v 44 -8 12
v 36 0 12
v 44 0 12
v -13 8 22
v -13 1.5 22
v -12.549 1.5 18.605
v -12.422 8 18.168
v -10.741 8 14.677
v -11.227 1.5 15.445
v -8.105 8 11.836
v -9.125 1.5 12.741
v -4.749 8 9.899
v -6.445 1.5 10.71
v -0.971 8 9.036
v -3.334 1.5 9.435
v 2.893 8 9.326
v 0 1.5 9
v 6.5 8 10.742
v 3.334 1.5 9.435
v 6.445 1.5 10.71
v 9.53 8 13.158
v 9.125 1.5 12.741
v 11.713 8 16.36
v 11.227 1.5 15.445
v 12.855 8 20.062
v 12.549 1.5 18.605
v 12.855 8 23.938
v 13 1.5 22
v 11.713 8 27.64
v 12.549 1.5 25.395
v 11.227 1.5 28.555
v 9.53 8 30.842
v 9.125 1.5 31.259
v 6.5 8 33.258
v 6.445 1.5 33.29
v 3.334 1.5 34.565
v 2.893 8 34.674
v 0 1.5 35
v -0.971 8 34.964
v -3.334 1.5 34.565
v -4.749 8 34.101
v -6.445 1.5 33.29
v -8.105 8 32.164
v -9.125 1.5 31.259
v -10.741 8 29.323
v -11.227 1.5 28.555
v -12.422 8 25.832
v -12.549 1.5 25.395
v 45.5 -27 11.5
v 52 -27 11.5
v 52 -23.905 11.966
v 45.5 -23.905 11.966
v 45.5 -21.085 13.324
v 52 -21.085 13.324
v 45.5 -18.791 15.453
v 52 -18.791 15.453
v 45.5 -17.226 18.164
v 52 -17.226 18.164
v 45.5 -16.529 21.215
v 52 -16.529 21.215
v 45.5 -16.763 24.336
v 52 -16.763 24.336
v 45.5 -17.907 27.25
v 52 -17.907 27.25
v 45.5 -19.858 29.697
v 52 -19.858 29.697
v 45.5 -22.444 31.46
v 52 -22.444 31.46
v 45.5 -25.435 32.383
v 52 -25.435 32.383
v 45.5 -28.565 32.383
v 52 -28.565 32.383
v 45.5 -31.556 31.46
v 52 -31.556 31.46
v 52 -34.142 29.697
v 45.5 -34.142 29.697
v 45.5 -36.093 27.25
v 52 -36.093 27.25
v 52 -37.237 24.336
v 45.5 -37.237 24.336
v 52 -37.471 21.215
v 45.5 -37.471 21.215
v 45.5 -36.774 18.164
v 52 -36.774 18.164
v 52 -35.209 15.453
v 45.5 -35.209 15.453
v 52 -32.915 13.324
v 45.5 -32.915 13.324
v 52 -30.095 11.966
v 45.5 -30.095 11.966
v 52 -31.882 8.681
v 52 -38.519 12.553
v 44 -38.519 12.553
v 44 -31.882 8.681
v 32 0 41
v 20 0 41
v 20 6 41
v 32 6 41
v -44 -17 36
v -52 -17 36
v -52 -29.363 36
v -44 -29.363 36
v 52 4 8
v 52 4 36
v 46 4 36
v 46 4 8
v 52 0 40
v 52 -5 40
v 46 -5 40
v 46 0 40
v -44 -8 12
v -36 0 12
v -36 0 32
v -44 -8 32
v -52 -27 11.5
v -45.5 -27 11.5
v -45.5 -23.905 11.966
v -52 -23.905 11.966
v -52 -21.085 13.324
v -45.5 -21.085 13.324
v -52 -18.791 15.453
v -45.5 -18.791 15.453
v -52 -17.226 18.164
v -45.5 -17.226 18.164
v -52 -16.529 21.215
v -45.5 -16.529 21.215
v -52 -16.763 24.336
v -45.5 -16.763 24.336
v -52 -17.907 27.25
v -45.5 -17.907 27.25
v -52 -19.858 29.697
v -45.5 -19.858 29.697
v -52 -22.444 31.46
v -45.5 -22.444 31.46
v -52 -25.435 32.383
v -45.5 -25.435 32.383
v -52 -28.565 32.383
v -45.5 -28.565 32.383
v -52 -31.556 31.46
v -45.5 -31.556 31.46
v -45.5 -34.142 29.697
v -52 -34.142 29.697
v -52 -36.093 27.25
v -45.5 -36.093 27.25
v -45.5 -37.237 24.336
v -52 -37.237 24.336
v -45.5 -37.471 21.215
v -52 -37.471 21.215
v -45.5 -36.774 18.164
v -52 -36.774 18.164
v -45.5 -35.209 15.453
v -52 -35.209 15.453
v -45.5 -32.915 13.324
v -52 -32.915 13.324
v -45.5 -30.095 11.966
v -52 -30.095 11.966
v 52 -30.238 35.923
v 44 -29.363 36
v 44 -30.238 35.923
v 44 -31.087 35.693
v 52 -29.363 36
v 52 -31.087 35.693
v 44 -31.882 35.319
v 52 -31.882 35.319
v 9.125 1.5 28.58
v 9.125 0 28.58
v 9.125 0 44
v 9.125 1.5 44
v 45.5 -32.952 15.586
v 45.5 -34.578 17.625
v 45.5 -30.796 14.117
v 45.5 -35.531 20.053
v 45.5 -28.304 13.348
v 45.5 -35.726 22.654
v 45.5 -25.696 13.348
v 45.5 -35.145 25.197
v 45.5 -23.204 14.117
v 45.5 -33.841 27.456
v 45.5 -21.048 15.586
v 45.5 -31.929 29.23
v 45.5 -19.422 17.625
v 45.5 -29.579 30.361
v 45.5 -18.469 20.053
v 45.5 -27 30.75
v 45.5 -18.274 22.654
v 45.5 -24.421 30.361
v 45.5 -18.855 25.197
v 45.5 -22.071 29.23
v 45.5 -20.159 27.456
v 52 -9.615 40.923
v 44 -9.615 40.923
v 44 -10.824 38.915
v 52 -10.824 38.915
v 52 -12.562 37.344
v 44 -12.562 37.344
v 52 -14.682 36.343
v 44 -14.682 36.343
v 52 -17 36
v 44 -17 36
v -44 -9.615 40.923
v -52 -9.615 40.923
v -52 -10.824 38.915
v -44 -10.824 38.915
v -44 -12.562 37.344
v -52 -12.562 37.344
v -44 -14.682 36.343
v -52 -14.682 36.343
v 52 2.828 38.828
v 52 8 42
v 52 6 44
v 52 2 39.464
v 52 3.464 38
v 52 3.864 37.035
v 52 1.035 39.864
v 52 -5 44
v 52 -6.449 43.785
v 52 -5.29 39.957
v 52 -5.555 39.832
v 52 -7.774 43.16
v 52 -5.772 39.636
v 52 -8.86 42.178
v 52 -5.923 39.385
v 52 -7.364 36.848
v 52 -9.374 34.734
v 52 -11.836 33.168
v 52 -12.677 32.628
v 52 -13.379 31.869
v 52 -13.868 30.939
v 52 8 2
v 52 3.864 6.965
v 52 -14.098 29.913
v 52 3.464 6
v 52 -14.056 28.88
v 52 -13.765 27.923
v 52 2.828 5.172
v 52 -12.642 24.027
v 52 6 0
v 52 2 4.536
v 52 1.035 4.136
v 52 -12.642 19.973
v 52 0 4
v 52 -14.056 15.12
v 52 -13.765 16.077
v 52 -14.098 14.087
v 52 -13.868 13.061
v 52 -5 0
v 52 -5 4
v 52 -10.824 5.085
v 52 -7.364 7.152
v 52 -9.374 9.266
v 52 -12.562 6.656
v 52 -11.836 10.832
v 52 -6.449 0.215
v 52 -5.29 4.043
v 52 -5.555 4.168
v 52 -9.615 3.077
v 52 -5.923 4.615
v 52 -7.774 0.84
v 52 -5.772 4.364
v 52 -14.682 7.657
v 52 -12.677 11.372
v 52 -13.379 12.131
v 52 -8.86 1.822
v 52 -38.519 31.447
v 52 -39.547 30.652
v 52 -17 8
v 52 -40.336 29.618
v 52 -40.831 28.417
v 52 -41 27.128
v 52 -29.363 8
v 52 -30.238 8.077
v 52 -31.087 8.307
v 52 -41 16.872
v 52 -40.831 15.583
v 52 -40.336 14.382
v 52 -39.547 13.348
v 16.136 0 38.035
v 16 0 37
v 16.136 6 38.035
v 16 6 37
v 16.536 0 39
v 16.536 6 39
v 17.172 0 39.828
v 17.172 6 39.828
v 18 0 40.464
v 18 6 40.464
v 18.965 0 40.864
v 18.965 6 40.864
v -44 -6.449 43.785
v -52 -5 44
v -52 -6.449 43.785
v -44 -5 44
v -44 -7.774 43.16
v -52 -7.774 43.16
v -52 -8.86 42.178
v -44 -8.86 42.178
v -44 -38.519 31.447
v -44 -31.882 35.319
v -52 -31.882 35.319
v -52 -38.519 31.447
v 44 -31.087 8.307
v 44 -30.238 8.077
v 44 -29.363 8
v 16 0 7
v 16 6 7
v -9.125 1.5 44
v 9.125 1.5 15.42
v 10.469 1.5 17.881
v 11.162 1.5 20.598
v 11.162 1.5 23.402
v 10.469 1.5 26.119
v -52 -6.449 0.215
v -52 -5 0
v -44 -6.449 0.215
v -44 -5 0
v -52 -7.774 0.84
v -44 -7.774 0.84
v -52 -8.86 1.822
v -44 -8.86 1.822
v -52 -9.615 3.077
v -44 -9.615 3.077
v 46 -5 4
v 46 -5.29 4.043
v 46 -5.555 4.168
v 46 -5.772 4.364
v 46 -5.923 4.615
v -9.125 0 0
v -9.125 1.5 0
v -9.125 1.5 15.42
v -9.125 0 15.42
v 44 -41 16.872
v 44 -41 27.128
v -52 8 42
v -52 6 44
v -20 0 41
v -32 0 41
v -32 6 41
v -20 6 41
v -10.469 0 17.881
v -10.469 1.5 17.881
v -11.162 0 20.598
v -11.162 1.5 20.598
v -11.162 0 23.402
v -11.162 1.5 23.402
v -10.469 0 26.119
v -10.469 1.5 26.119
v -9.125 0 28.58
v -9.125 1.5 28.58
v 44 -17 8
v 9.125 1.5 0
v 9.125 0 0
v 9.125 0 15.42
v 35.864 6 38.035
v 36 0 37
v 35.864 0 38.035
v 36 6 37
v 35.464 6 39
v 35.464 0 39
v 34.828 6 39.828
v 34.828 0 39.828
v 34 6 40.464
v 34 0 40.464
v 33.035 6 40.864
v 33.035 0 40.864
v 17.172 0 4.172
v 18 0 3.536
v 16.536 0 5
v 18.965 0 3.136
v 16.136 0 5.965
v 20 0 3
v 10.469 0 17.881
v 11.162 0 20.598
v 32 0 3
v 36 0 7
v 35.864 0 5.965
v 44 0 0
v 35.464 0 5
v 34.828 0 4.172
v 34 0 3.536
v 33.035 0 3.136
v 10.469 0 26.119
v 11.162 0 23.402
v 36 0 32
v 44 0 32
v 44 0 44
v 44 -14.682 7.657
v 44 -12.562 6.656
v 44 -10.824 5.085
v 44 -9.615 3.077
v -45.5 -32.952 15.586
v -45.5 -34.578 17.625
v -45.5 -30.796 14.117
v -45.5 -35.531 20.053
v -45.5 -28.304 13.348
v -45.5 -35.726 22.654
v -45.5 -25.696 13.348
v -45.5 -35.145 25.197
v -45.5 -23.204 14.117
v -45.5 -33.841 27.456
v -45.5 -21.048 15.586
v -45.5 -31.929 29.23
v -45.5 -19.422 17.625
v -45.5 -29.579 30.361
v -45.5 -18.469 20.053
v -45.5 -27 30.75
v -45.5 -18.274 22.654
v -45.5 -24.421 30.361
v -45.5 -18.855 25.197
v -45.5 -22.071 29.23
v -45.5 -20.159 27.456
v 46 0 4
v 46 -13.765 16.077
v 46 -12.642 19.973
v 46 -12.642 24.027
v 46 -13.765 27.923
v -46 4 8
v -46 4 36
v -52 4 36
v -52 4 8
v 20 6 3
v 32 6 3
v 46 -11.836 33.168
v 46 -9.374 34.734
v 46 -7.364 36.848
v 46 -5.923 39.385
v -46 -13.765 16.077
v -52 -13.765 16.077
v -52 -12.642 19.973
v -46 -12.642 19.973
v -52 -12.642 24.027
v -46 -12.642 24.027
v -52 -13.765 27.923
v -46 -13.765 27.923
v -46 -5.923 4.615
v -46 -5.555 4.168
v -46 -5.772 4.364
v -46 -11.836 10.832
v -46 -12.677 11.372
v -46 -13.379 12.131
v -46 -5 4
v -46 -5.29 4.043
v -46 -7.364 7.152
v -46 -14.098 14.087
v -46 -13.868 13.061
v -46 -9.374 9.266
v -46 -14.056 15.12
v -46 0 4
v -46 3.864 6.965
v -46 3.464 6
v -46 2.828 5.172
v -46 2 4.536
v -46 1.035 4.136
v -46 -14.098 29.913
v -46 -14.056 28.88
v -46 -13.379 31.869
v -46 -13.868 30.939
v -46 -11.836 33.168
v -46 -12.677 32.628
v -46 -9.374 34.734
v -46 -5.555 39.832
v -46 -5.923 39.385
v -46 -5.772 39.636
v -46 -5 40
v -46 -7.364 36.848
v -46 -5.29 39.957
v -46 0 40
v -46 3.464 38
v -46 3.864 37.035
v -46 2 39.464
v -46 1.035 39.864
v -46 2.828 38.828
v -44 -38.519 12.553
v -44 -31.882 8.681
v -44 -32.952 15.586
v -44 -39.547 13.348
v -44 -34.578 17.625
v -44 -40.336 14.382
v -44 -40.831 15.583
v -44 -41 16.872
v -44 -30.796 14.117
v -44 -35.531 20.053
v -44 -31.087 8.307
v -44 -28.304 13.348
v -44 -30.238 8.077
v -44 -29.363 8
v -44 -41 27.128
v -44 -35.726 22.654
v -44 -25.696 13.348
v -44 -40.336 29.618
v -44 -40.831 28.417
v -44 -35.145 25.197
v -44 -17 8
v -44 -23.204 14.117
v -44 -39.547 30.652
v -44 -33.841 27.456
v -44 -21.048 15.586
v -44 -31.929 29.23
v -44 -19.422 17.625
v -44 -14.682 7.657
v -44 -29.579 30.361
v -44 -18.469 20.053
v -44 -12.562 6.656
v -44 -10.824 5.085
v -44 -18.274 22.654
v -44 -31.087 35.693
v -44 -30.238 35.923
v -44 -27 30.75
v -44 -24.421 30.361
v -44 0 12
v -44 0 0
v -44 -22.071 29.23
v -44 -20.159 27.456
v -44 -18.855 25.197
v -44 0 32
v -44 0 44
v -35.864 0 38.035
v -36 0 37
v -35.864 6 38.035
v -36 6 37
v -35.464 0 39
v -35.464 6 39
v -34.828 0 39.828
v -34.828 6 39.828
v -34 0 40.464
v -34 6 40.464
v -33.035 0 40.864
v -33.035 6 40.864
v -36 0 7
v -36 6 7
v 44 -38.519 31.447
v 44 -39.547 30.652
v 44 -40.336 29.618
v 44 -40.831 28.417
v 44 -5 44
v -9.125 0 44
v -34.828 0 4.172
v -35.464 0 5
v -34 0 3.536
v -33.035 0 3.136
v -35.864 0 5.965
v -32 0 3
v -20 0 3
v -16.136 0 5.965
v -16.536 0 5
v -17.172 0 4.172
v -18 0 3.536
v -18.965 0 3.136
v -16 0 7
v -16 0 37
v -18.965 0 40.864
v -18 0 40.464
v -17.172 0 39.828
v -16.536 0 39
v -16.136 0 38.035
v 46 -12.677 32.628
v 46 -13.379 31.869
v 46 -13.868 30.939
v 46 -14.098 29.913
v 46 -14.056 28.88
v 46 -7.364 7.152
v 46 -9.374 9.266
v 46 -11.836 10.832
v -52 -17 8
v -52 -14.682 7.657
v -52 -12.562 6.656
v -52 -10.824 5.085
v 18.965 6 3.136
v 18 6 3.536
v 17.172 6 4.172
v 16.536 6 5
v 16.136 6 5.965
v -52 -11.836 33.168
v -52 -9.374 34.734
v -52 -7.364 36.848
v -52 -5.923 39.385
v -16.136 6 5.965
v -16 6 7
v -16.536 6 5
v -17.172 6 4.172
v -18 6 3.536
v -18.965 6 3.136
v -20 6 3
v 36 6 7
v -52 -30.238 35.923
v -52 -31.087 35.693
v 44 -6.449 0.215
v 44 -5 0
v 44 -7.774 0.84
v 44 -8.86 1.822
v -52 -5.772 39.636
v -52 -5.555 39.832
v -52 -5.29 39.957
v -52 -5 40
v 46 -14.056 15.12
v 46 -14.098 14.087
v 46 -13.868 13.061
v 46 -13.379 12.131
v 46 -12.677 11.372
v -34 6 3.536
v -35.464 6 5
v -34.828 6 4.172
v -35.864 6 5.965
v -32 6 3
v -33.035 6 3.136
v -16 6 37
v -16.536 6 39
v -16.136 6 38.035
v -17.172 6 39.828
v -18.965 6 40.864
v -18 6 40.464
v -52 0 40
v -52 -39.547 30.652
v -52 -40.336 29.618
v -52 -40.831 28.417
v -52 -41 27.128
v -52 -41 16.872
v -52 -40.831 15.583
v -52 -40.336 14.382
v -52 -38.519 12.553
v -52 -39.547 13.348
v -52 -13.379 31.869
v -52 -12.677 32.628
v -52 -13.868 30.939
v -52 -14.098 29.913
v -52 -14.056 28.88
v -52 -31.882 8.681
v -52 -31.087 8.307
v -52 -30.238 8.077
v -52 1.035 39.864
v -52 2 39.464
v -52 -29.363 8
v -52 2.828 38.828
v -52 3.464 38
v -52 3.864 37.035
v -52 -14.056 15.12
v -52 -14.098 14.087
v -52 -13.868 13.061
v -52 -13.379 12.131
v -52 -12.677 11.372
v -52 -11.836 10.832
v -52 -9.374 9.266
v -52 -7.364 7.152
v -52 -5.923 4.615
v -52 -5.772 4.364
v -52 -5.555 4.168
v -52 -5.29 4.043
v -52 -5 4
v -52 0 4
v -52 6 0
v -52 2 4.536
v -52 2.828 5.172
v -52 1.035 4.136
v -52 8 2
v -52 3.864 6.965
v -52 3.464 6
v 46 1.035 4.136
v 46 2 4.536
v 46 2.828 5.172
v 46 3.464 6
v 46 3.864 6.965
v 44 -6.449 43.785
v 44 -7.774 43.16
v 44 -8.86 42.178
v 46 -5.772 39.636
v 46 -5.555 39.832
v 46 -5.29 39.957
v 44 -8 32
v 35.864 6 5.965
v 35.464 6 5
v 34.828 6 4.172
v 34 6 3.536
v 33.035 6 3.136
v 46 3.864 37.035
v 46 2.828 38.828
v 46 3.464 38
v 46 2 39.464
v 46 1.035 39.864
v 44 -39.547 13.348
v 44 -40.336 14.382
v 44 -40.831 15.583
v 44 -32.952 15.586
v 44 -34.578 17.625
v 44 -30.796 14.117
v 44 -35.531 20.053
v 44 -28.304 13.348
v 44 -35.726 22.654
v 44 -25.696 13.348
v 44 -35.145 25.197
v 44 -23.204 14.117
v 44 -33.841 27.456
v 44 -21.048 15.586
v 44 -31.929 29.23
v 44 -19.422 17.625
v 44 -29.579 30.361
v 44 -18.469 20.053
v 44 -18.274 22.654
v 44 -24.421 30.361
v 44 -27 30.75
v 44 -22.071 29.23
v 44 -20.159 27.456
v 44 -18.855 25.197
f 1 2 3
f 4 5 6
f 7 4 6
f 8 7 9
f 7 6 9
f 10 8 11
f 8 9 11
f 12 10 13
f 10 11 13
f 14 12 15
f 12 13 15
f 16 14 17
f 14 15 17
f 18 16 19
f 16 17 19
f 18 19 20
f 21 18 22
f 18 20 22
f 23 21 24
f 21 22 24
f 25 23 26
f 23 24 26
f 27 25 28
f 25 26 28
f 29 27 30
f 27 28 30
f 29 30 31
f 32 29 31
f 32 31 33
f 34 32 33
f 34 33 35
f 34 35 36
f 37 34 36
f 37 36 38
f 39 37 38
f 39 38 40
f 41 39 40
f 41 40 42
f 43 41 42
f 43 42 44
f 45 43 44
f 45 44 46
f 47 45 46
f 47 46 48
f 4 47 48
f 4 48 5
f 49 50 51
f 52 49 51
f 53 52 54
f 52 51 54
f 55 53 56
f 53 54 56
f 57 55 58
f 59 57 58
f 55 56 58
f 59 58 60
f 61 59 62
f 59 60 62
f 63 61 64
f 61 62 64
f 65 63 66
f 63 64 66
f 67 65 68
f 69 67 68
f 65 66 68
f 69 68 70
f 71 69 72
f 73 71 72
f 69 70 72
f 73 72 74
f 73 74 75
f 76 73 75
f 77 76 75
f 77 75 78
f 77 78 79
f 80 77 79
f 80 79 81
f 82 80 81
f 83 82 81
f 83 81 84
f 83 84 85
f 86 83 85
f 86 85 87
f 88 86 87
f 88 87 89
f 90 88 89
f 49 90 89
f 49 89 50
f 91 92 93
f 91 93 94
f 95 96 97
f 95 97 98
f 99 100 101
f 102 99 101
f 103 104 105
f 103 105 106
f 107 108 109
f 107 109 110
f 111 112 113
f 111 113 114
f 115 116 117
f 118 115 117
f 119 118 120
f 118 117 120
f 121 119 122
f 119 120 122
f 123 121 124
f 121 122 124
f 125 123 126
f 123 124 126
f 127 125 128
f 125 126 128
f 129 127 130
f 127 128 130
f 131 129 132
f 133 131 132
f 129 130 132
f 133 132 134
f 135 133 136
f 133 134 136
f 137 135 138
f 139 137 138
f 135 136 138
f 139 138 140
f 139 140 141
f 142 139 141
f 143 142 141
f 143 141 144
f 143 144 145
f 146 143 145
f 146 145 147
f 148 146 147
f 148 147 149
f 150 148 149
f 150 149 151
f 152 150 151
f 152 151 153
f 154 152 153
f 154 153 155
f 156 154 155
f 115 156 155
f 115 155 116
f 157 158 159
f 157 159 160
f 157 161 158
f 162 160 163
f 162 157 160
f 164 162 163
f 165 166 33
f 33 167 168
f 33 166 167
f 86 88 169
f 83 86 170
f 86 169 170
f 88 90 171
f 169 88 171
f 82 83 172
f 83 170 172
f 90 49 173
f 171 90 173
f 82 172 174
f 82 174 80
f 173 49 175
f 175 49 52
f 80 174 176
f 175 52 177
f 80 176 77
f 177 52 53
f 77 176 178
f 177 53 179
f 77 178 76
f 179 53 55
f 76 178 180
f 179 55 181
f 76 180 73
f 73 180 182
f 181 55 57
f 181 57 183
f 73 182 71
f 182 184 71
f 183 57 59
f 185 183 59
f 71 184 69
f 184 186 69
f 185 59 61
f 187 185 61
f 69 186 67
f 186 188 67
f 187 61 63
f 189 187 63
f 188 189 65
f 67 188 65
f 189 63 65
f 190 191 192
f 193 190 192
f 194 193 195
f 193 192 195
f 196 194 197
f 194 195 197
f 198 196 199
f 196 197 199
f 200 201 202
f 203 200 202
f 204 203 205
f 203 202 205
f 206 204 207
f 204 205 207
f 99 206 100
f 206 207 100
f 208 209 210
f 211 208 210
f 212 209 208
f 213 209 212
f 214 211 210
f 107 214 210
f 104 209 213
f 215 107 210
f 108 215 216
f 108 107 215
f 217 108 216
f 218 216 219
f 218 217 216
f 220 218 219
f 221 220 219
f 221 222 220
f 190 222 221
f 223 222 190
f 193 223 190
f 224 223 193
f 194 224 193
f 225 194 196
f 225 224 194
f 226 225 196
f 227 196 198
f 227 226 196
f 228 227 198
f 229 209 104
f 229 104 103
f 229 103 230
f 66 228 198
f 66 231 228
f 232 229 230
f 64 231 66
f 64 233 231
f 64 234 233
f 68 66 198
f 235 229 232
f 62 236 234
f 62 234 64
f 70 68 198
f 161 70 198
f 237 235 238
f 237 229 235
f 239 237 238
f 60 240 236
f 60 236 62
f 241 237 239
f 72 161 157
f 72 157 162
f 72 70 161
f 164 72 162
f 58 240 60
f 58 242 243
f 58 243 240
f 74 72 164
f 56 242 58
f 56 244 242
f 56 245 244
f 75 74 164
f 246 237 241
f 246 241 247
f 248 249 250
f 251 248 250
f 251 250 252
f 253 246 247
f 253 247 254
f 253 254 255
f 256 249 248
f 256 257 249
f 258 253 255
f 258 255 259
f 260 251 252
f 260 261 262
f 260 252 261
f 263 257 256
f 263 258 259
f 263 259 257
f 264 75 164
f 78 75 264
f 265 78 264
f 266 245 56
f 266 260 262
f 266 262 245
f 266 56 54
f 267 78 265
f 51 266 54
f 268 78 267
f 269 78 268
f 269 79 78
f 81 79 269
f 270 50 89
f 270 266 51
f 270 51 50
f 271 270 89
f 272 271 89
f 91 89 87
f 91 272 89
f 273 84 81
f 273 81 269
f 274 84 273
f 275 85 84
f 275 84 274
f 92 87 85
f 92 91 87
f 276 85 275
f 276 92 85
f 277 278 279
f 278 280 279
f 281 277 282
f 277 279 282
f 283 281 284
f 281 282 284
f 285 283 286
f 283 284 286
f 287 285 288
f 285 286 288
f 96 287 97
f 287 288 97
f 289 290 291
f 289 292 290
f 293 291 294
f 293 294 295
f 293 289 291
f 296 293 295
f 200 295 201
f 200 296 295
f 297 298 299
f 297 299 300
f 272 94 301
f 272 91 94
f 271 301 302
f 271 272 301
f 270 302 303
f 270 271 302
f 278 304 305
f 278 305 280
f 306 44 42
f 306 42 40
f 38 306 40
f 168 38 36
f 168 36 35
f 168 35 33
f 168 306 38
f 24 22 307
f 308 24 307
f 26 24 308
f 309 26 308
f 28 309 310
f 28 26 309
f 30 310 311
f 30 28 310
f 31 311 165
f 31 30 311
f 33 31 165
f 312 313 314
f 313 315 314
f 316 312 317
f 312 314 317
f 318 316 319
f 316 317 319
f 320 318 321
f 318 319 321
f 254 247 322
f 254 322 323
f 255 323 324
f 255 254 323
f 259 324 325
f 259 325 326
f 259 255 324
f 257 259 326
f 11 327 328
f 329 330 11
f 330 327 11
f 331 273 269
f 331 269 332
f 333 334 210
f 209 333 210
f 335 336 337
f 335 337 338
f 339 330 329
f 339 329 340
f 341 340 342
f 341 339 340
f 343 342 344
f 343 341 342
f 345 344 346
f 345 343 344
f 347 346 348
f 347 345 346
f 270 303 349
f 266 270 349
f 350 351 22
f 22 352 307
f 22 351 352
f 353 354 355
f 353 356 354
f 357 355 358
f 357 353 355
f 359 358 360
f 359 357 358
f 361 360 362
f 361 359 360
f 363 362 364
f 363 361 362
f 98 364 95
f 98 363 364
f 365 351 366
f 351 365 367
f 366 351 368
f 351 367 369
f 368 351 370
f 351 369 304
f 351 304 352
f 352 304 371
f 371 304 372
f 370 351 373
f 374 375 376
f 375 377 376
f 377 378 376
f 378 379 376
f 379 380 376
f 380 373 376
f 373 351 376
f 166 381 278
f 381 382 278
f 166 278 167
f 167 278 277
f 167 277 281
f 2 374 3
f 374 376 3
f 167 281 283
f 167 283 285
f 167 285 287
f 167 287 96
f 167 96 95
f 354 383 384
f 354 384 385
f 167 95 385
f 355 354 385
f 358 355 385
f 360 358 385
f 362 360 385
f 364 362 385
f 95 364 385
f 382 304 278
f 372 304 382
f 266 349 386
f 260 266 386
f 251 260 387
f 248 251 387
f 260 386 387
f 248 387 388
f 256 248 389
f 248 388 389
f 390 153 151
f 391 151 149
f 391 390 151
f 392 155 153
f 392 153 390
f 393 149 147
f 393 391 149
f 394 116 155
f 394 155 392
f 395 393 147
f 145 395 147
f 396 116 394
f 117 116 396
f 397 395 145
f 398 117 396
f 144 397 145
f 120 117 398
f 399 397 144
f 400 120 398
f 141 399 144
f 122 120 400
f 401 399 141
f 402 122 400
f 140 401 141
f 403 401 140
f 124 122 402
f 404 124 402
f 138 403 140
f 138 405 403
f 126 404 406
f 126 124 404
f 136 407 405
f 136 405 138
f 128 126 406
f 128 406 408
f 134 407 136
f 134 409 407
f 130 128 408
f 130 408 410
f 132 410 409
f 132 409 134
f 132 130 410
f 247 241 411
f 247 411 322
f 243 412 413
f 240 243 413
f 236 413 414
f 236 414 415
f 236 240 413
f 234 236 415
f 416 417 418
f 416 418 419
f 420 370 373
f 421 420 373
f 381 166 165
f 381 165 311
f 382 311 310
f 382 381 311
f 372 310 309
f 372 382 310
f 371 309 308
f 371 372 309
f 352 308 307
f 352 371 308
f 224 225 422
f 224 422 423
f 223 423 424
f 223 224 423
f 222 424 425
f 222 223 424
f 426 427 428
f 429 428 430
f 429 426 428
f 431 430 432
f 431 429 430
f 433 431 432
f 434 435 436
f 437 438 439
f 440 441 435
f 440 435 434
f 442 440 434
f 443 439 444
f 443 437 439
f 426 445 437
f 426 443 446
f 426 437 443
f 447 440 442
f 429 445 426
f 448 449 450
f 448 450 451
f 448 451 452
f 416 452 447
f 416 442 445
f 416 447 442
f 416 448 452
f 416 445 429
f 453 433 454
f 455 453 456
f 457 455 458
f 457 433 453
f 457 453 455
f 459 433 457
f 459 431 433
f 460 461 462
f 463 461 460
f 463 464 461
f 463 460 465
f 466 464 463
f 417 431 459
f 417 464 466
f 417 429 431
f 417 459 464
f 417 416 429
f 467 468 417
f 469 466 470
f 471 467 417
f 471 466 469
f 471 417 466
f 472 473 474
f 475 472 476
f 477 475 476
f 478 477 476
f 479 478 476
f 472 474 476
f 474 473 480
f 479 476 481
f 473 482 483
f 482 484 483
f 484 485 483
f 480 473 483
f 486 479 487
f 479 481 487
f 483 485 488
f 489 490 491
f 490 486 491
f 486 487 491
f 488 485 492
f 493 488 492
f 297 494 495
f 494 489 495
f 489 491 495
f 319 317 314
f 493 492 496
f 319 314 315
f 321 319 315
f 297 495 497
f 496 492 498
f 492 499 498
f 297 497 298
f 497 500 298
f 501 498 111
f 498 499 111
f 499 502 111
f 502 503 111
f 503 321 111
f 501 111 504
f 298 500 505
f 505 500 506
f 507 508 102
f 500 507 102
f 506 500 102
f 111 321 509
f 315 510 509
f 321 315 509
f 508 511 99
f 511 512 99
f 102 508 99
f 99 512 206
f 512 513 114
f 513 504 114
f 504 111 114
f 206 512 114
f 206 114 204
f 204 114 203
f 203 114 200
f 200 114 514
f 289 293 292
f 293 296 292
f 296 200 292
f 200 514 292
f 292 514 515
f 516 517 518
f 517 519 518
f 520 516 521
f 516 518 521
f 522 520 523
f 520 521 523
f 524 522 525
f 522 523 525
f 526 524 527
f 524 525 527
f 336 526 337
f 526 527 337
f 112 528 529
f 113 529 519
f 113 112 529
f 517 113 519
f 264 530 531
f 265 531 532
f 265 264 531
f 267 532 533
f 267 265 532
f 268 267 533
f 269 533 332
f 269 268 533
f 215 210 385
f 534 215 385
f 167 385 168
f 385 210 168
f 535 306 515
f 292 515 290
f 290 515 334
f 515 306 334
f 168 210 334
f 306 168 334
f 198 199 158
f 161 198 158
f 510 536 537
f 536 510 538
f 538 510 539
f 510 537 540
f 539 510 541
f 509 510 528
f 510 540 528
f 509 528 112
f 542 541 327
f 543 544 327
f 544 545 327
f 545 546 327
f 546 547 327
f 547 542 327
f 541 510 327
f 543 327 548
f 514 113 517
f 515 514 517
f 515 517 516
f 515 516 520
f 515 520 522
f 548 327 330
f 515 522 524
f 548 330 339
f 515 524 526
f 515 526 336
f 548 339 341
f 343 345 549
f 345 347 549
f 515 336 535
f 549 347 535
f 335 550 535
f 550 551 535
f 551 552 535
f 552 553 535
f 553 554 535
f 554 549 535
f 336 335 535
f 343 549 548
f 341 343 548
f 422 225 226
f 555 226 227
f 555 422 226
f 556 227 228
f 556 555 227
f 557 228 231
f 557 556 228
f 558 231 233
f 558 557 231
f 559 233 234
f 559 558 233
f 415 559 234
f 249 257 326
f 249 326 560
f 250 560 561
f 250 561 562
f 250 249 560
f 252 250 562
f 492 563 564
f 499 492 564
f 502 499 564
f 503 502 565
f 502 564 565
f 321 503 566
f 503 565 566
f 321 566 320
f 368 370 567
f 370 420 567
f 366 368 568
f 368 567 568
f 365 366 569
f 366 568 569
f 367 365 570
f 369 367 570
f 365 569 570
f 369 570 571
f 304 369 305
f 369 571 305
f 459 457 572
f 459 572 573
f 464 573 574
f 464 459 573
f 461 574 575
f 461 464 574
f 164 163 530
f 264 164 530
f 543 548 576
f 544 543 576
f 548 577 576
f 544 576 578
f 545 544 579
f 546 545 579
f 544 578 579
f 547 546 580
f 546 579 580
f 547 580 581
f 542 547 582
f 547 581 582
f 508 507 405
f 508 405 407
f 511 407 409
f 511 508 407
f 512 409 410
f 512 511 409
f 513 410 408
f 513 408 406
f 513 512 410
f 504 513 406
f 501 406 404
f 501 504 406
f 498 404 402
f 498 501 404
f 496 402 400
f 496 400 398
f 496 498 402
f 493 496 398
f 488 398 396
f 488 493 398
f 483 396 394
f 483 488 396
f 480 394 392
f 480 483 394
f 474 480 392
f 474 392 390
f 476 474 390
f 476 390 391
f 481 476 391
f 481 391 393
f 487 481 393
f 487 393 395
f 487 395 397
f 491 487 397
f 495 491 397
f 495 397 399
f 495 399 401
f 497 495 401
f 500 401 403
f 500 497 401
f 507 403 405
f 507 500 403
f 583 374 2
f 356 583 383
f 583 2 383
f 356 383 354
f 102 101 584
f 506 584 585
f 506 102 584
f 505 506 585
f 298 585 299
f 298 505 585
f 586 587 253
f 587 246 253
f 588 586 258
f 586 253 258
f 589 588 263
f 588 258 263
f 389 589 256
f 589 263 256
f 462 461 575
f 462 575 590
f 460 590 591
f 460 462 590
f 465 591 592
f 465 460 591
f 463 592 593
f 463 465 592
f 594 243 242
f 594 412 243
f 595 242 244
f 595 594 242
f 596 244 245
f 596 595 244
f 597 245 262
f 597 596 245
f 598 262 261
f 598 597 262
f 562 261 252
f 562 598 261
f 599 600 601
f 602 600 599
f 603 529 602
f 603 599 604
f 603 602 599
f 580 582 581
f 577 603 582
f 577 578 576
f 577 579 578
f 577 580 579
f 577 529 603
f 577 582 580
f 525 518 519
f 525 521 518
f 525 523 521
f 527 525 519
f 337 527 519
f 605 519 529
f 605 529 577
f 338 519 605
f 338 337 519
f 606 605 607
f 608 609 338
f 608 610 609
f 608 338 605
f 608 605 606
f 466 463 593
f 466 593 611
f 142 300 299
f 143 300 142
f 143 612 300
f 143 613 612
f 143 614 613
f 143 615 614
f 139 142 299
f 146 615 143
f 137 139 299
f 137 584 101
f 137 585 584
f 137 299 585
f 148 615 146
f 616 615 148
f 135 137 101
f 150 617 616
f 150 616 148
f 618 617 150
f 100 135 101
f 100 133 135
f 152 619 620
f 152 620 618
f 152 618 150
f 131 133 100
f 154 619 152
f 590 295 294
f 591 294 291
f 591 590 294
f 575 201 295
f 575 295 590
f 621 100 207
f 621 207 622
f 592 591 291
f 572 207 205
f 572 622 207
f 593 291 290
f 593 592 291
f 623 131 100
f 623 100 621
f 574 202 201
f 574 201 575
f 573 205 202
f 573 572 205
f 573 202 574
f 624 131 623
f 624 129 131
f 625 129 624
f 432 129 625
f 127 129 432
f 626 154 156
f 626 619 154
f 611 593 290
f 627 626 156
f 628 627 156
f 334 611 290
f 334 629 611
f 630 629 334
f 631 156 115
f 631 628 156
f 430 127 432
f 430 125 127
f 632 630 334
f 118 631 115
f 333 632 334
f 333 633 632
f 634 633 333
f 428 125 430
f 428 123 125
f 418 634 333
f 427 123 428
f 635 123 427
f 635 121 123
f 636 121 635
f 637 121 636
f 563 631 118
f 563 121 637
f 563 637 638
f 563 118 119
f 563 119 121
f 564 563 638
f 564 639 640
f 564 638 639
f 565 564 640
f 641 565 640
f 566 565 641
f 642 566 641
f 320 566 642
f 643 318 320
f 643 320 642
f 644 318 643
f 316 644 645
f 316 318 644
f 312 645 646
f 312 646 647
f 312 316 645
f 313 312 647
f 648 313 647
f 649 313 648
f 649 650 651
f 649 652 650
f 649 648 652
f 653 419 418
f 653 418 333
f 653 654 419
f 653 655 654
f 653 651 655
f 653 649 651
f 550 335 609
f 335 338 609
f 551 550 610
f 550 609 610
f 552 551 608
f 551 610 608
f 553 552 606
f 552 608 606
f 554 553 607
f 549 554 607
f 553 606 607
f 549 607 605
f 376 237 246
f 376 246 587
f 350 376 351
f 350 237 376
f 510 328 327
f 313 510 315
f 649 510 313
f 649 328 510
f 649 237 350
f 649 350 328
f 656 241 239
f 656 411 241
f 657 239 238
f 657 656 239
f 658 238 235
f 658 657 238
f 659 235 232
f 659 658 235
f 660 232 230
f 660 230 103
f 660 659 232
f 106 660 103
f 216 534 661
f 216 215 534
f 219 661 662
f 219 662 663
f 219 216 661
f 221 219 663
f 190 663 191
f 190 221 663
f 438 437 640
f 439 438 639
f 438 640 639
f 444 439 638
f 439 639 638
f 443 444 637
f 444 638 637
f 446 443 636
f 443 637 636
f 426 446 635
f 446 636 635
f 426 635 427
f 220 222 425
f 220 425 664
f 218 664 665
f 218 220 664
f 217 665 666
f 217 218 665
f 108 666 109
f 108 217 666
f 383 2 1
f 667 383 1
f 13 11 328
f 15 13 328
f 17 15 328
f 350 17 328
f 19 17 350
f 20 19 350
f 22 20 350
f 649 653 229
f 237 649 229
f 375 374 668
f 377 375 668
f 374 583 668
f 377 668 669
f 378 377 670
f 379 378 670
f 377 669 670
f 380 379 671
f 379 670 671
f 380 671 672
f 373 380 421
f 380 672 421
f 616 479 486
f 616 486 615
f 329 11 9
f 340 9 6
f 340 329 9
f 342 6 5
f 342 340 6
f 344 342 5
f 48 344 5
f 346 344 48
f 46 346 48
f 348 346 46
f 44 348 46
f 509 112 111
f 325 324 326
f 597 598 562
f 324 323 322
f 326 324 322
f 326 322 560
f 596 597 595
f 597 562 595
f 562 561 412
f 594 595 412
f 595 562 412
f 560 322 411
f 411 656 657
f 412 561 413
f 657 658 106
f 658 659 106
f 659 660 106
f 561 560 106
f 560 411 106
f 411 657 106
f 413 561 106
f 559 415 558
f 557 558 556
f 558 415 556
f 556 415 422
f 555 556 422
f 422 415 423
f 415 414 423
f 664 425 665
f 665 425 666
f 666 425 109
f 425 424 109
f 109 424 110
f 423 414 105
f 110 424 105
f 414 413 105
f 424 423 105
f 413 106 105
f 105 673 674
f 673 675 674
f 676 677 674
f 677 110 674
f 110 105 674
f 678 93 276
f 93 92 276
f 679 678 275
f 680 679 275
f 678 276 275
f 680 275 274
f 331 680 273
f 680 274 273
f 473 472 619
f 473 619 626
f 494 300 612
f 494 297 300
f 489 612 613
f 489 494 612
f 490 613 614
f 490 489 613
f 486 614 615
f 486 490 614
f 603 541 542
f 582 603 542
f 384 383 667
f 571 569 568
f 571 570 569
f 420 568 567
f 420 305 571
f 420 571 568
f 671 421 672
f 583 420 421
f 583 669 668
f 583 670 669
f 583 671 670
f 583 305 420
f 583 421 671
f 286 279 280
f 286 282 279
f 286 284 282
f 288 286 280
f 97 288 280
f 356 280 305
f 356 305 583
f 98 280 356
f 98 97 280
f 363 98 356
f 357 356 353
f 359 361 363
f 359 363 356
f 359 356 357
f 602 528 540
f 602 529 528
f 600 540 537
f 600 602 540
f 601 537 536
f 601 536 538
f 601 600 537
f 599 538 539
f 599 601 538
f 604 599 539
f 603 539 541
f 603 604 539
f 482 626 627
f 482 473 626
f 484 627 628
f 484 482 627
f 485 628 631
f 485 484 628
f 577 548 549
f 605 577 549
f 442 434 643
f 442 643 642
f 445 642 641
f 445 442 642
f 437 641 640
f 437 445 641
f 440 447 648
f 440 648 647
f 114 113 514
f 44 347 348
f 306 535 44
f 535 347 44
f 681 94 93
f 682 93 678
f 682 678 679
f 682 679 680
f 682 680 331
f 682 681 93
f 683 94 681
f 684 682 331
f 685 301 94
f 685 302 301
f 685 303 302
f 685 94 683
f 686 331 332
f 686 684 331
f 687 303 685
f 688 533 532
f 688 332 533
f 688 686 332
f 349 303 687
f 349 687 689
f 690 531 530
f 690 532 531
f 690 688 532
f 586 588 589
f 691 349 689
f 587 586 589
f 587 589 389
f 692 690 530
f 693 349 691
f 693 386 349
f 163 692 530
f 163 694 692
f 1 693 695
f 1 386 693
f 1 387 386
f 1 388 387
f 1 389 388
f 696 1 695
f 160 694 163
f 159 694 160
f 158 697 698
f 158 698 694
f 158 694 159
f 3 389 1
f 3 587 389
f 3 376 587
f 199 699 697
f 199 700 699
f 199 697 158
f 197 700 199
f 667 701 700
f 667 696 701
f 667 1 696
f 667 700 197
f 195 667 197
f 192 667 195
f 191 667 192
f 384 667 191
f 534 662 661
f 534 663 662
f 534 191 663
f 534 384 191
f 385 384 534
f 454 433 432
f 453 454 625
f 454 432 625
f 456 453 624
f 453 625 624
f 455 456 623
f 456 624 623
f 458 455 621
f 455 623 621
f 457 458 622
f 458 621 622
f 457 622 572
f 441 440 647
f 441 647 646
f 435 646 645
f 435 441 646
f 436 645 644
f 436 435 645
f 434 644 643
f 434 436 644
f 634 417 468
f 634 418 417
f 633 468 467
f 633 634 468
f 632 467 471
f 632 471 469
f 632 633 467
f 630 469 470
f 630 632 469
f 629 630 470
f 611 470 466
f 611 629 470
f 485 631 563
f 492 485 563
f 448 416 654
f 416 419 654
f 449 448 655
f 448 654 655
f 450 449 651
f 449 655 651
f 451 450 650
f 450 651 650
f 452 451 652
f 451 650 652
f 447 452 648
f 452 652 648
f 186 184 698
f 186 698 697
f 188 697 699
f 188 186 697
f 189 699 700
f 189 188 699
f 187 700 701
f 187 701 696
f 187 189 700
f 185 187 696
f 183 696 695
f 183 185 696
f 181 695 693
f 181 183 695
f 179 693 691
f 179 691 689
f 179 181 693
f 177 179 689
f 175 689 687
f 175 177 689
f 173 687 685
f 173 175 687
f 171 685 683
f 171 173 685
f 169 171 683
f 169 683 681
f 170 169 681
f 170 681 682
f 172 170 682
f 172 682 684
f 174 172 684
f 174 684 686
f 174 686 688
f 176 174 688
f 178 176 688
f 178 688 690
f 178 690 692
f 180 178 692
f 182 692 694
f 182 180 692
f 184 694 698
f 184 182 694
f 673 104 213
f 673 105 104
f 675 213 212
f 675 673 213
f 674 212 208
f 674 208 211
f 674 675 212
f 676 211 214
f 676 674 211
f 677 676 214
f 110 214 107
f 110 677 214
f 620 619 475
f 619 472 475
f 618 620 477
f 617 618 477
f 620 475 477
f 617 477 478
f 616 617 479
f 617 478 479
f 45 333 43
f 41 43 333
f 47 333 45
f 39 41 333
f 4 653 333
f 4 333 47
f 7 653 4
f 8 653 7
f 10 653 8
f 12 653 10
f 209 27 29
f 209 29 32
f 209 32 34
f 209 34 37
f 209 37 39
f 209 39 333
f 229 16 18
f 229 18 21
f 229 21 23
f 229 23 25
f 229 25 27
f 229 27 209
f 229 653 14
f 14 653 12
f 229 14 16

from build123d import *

# Parameters (mm, degrees)
BOSS_EXTRUDE1_DEPTH        = 44
F_21_0_21_DIAMETER_HOLE1_D = 21
F_26_0_26_DIAMETER_HOLE1_D = 26
BOSS_EXTRUDE2_START        = -1.5
SKETCH9_R                  = 10.5
SKETCH9_R_2                = 8.75
BOSS_EXTRUDE2_DEPTH        = 1.5
BOSS_EXTRUDE3_START        = 88
SKETCH9_2_R                = 10.5
SKETCH9_2_R_2              = 8.75
BOSS_EXTRUDE3_DEPTH        = 1.5
SKETCH16_R                 = 13
SKETCH16_R_2               = 11.25
BOSS_EXTRUDE4_DEPTH        = 1.5
SKETCH17_W                 = 18.25
SKETCH17_H                 = 1.5
CUT_EXTRUDE1_DEPTH         = 80.504716841
CUT_EXTRUDE3_DEPTH         = 121.137421314
FILLET3_R                  = 5
RIB1_REACH                 = 71.778
SKETCH20_WALL_W            = 152.870148694
SKETCH20_WALL_H            = 20
RIB2_REACH                 = 71.778
SKETCH21_WALL_W            = 152.870148694
SKETCH21_WALL_H            = 20
SKETCH22_W                 = 20
SKETCH22_H                 = 38
CUT_EXTRUDE4_DEPTH         = 6
CUT_EXTRUDE5_DEPTH         = 121.137421314
CUT_EXTRUDE5_DEPTH_BACK    = 6
CUT_EXTRUDE6_START         = -104
CUT_EXTRUDE6_DEPTH         = 6
FILLET4_R                  = 4
CHAMFER1_SIZE              = 2


with BuildPart() as part:
    # Sketch1 → Boss-Extrude1 (new body)
    with BuildSketch(Plane.XY):
        Polygon((44, 0), (-44, 0), (-44, -41), (-52, -41), (-52, 8), (52, 8), (52, -41), (44, -41), align=None)
    extrude(amount=BOSS_EXTRUDE1_DEPTH)

    # Ø21.0 (21) Diameter Hole1 (through all)
    with Locations(Plane.ZY.offset(52)):
        with Locations((22, -27)):
            Hole(F_21_0_21_DIAMETER_HOLE1_D / 2)

    # Ø26.0 (26) Diameter Hole1 (through all)
    with Locations(Plane(origin=(0, 8, 0), x_dir=(1, 0, 0), z_dir=(0, 1, 0))):
        with Locations((0, -22)):
            Hole(F_26_0_26_DIAMETER_HOLE1_D / 2)

    # Sketch9 → Boss-Extrude2 (add)
    with BuildSketch(Plane.ZY.offset(-44).offset(BOSS_EXTRUDE2_START)):
        with Locations((22, -27)):
            Circle(SKETCH9_R)
        with Locations((22, -27)):
            Circle(SKETCH9_R_2, mode=Mode.SUBTRACT)
    extrude(amount=BOSS_EXTRUDE2_DEPTH)

    # Sketch9<2> → Boss-Extrude3 (add)
    with BuildSketch(Plane.ZY.offset(-44).offset(BOSS_EXTRUDE3_START)):
        with Locations((22, -27)):
            Circle(SKETCH9_2_R)
        with Locations((22, -27)):
            Circle(SKETCH9_2_R_2, mode=Mode.SUBTRACT)
    extrude(amount=BOSS_EXTRUDE3_DEPTH)

    # Sketch16 → Boss-Extrude4 (add)
    with BuildSketch(Plane(origin=(0, 0, 0), x_dir=(1, 0, 0), z_dir=(0, 1, 0))):
        with Locations(Location((0, -22, 0), (0, 0, 270))):
            Circle(SKETCH16_R)
        with Locations(Location((0, -22, 0), (0, 0, 270))):
            Circle(SKETCH16_R_2, mode=Mode.SUBTRACT)
    extrude(amount=BOSS_EXTRUDE4_DEPTH)

    # Sketch17 → Cut-Extrude1 (cut, through all)
    with BuildSketch(Plane.XY.offset(44)):
        with Locations((0, 0.75)):
            Rectangle(SKETCH17_W, SKETCH17_H)
    extrude(amount=-CUT_EXTRUDE1_DEPTH, mode=Mode.SUBTRACT)

    # Sketch19 → Cut-Extrude3 (cut, through all)
    with BuildSketch(Plane.ZY.offset(52)):
        with BuildLine():
            ThreePointArc((0, -25), (2.087839834, -24.722753708), (4.030968204, -23.910231207))
            Line((4.030968204, -23.910231207), (0, -17))
            Line((0, -17), (0, -25))
        make_face()
        with BuildLine():
            Line((0, -17), (4.030968204, -23.910231207))
            ThreePointArc((4.030968204, -23.910231207), (6.937137221, -20.984485812), (8, -17))
            ThreePointArc((8, -17), (5.656854249, -11.343145751), (0, -9))
            Line((0, -9), (0, -17))
        make_face()
        with BuildLine():
            Line((14, -41), (8, -30.714285714))
            Line((8, -30.714285714), (4.030968204, -23.910231207))
            ThreePointArc((4.030968204, -23.910231207), (2.087839834, -24.722753708), (0, -25))
            Line((0, -25), (0, -41))
            Line((0, -41), (14, -41))
        make_face()
        with BuildLine():
            Line((4.030968204, -23.910231207), (8, -30.714285714))
            Line((8, -30.714285714), (8, -17))
            ThreePointArc((8, -17), (6.937137221, -20.984485812), (4.030968204, -23.910231207))
        make_face()
        with BuildLine():
            Line((36, -17), (36, -30.714285714))
            Line((36, -30.714285714), (39.969031796, -23.910231207))
            ThreePointArc((39.969031796, -23.910231207), (37.062862779, -20.984485812), (36, -17))
        make_face()
        with BuildLine():
            ThreePointArc((39.969031796, -23.910231207), (41.912160166, -24.722753708), (44, -25))
            Line((44, -25), (44, -17))
            Line((44, -17), (39.969031796, -23.910231207))
        make_face()
        with BuildLine():
            ThreePointArc((44, -9), (38.343145751, -11.343145751), (36, -17))
            ThreePointArc((36, -17), (37.062862779, -20.984485812), (39.969031796, -23.910231207))
            Line((39.969031796, -23.910231207), (44, -17))
            Line((44, -17), (44, -9))
        make_face()
        with BuildLine():
            Line((36, -30.714285714), (30, -41))
            Line((30, -41), (44, -41))
            Line((44, -41), (44, -25))
            ThreePointArc((44, -25), (41.912160166, -24.722753708), (39.969031796, -23.910231207))
            Line((39.969031796, -23.910231207), (36, -30.714285714))
        make_face()
    extrude(amount=-CUT_EXTRUDE3_DEPTH, mode=Mode.SUBTRACT)

    # Fillet3
    fillet3_edges = [part.edges().sort_by_distance(p)[0] for p in [
        (48, -9, 0),
        (-48, -9, 0),
        (-48, -9, 44),
        (48, -9, 44),
        (-48, -30.714285714, 36),
        (48, -30.714285714, 36),
        (-48, -41, 30),
        (48, -41, 30),
        (-48, -30.714285714, 8),
        (48, -30.714285714, 8),
        (-48, -41, 14),
        (48, -41, 14),
    ]]
    fillet(fillet3_edges, radius=FILLET3_R)

    # Sketch20 wall → Rib1 (add, up to next)
    with BuildSketch(Plane(origin=(-40, -4, 22), x_dir=(-0.707106781187, -0.707106781187, 0), z_dir=(0.707106781187, -0.707106781187, 0)), mode=Mode.PRIVATE) as rib1_sk1:
        Rectangle(SKETCH20_WALL_W, SKETCH20_WALL_H)
    rib1_tool1 = extrude(rib1_sk1.sketch, amount=-RIB1_REACH, mode=Mode.PRIVATE) - part.part
    add(rib1_tool1.solids().sort_by_distance((-40, -4, 22))[0])

    # Sketch21 wall → Rib2 (add, up to next)
    with BuildSketch(Plane(origin=(40, -4, 22), x_dir=(0.707106781187, -0.707106781187, 0), z_dir=(0.707106781187, 0.707106781187, 0)), mode=Mode.PRIVATE) as rib2_sk1:
        Rectangle(SKETCH21_WALL_W, SKETCH21_WALL_H)
    rib2_tool1 = extrude(rib2_sk1.sketch, amount=RIB2_REACH, mode=Mode.PRIVATE) - part.part
    add(rib2_tool1.solids().sort_by_distance((40, -4, 22))[0])

    # Sketch22 → Cut-Extrude4 (cut)
    with BuildSketch(Plane.XZ):
        with Locations((-26, 22)):
            Rectangle(SKETCH22_W, SKETCH22_H)
        with Locations((26, 22)):
            Rectangle(SKETCH22_W, SKETCH22_H)
    extrude(amount=-CUT_EXTRUDE4_DEPTH, mode=Mode.SUBTRACT)

    # Sketch23 → Cut-Extrude5 (cut, two sides: drawn at the far end of the back side and taken through both)
    with BuildSketch(Plane.ZY.offset(52).offset(-CUT_EXTRUDE5_DEPTH_BACK)):
        with BuildLine():
            Line((40, -5), (40, 4))
            Line((40, 4), (4, 4))
            Line((4, 4), (4, -5))
            ThreePointArc((4, -5), (4.167949706, -5.554700196), (4.615384615, -5.923076923))
            ThreePointArc((4.615384615, -5.923076923), (9.846465163, -10.140909405), (11.989973592, -16.509558097))
            ThreePointArc((11.989973592, -16.509558097), (22, -12.5), (32.010026408, -16.509558097))
            ThreePointArc((32.010026408, -16.509558097), (34.153534837, -10.140909405), (39.384615385, -5.923076923))
            ThreePointArc((39.384615385, -5.923076923), (39.832050294, -5.554700196), (40, -5))
        make_face()
    extrude(amount=CUT_EXTRUDE5_DEPTH + CUT_EXTRUDE5_DEPTH_BACK, mode=Mode.SUBTRACT)

    # Sketch23<3> → Cut-Extrude6 (cut)
    with BuildSketch(Plane.ZY.offset(52).offset(CUT_EXTRUDE6_START)):
        with BuildLine():
            Line((40, -5), (40, 4))
            Line((40, 4), (4, 4))
            Line((4, 4), (4, -5))
            ThreePointArc((4, -5), (4.167949706, -5.554700196), (4.615384615, -5.923076923))
            ThreePointArc((4.615384615, -5.923076923), (9.846465163, -10.140909405), (11.989973592, -16.509558097))
            ThreePointArc((11.989973592, -16.509558097), (22, -12.5), (32.010026408, -16.509558097))
            ThreePointArc((32.010026408, -16.509558097), (34.153534837, -10.140909405), (39.384615385, -5.923076923))
            ThreePointArc((39.384615385, -5.923076923), (39.832050294, -5.554700196), (40, -5))
        make_face()
    extrude(amount=CUT_EXTRUDE6_DEPTH, mode=Mode.SUBTRACT)

    # Fillet4
    fillet4_edges = [part.edges().sort_by_distance(p)[0] for p in [
        (-49, -16.509558097, 11.989973592),
        (-49, -16.509558097, 32.010026408),
        (49, -16.509558097, 32.010026408),
        (49, -16.509558097, 11.989973592),
        (49, 4, 4),
        (49, 4, 40),
        (-49, 4, 40),
        (-49, 4, 4),
        (36, 3, 3),
        (-16, 3, 3),
        (36, 3, 41),
        (-16, 3, 41),
        (-36, 3, 3),
        (16, 3, 3),
        (16, 3, 41),
        (-36, 3, 41),
    ]]
    fillet(fillet4_edges, radius=FILLET4_R)

    # Chamfer1
    chamfer1_edges = [part.edges().sort_by_distance(p)[0] for p in [
        (0, 8, 44),
        (0, 8, 0),
    ]]
    chamfer(chamfer1_edges, length=CHAMFER1_SIZE)


solid = part.part
